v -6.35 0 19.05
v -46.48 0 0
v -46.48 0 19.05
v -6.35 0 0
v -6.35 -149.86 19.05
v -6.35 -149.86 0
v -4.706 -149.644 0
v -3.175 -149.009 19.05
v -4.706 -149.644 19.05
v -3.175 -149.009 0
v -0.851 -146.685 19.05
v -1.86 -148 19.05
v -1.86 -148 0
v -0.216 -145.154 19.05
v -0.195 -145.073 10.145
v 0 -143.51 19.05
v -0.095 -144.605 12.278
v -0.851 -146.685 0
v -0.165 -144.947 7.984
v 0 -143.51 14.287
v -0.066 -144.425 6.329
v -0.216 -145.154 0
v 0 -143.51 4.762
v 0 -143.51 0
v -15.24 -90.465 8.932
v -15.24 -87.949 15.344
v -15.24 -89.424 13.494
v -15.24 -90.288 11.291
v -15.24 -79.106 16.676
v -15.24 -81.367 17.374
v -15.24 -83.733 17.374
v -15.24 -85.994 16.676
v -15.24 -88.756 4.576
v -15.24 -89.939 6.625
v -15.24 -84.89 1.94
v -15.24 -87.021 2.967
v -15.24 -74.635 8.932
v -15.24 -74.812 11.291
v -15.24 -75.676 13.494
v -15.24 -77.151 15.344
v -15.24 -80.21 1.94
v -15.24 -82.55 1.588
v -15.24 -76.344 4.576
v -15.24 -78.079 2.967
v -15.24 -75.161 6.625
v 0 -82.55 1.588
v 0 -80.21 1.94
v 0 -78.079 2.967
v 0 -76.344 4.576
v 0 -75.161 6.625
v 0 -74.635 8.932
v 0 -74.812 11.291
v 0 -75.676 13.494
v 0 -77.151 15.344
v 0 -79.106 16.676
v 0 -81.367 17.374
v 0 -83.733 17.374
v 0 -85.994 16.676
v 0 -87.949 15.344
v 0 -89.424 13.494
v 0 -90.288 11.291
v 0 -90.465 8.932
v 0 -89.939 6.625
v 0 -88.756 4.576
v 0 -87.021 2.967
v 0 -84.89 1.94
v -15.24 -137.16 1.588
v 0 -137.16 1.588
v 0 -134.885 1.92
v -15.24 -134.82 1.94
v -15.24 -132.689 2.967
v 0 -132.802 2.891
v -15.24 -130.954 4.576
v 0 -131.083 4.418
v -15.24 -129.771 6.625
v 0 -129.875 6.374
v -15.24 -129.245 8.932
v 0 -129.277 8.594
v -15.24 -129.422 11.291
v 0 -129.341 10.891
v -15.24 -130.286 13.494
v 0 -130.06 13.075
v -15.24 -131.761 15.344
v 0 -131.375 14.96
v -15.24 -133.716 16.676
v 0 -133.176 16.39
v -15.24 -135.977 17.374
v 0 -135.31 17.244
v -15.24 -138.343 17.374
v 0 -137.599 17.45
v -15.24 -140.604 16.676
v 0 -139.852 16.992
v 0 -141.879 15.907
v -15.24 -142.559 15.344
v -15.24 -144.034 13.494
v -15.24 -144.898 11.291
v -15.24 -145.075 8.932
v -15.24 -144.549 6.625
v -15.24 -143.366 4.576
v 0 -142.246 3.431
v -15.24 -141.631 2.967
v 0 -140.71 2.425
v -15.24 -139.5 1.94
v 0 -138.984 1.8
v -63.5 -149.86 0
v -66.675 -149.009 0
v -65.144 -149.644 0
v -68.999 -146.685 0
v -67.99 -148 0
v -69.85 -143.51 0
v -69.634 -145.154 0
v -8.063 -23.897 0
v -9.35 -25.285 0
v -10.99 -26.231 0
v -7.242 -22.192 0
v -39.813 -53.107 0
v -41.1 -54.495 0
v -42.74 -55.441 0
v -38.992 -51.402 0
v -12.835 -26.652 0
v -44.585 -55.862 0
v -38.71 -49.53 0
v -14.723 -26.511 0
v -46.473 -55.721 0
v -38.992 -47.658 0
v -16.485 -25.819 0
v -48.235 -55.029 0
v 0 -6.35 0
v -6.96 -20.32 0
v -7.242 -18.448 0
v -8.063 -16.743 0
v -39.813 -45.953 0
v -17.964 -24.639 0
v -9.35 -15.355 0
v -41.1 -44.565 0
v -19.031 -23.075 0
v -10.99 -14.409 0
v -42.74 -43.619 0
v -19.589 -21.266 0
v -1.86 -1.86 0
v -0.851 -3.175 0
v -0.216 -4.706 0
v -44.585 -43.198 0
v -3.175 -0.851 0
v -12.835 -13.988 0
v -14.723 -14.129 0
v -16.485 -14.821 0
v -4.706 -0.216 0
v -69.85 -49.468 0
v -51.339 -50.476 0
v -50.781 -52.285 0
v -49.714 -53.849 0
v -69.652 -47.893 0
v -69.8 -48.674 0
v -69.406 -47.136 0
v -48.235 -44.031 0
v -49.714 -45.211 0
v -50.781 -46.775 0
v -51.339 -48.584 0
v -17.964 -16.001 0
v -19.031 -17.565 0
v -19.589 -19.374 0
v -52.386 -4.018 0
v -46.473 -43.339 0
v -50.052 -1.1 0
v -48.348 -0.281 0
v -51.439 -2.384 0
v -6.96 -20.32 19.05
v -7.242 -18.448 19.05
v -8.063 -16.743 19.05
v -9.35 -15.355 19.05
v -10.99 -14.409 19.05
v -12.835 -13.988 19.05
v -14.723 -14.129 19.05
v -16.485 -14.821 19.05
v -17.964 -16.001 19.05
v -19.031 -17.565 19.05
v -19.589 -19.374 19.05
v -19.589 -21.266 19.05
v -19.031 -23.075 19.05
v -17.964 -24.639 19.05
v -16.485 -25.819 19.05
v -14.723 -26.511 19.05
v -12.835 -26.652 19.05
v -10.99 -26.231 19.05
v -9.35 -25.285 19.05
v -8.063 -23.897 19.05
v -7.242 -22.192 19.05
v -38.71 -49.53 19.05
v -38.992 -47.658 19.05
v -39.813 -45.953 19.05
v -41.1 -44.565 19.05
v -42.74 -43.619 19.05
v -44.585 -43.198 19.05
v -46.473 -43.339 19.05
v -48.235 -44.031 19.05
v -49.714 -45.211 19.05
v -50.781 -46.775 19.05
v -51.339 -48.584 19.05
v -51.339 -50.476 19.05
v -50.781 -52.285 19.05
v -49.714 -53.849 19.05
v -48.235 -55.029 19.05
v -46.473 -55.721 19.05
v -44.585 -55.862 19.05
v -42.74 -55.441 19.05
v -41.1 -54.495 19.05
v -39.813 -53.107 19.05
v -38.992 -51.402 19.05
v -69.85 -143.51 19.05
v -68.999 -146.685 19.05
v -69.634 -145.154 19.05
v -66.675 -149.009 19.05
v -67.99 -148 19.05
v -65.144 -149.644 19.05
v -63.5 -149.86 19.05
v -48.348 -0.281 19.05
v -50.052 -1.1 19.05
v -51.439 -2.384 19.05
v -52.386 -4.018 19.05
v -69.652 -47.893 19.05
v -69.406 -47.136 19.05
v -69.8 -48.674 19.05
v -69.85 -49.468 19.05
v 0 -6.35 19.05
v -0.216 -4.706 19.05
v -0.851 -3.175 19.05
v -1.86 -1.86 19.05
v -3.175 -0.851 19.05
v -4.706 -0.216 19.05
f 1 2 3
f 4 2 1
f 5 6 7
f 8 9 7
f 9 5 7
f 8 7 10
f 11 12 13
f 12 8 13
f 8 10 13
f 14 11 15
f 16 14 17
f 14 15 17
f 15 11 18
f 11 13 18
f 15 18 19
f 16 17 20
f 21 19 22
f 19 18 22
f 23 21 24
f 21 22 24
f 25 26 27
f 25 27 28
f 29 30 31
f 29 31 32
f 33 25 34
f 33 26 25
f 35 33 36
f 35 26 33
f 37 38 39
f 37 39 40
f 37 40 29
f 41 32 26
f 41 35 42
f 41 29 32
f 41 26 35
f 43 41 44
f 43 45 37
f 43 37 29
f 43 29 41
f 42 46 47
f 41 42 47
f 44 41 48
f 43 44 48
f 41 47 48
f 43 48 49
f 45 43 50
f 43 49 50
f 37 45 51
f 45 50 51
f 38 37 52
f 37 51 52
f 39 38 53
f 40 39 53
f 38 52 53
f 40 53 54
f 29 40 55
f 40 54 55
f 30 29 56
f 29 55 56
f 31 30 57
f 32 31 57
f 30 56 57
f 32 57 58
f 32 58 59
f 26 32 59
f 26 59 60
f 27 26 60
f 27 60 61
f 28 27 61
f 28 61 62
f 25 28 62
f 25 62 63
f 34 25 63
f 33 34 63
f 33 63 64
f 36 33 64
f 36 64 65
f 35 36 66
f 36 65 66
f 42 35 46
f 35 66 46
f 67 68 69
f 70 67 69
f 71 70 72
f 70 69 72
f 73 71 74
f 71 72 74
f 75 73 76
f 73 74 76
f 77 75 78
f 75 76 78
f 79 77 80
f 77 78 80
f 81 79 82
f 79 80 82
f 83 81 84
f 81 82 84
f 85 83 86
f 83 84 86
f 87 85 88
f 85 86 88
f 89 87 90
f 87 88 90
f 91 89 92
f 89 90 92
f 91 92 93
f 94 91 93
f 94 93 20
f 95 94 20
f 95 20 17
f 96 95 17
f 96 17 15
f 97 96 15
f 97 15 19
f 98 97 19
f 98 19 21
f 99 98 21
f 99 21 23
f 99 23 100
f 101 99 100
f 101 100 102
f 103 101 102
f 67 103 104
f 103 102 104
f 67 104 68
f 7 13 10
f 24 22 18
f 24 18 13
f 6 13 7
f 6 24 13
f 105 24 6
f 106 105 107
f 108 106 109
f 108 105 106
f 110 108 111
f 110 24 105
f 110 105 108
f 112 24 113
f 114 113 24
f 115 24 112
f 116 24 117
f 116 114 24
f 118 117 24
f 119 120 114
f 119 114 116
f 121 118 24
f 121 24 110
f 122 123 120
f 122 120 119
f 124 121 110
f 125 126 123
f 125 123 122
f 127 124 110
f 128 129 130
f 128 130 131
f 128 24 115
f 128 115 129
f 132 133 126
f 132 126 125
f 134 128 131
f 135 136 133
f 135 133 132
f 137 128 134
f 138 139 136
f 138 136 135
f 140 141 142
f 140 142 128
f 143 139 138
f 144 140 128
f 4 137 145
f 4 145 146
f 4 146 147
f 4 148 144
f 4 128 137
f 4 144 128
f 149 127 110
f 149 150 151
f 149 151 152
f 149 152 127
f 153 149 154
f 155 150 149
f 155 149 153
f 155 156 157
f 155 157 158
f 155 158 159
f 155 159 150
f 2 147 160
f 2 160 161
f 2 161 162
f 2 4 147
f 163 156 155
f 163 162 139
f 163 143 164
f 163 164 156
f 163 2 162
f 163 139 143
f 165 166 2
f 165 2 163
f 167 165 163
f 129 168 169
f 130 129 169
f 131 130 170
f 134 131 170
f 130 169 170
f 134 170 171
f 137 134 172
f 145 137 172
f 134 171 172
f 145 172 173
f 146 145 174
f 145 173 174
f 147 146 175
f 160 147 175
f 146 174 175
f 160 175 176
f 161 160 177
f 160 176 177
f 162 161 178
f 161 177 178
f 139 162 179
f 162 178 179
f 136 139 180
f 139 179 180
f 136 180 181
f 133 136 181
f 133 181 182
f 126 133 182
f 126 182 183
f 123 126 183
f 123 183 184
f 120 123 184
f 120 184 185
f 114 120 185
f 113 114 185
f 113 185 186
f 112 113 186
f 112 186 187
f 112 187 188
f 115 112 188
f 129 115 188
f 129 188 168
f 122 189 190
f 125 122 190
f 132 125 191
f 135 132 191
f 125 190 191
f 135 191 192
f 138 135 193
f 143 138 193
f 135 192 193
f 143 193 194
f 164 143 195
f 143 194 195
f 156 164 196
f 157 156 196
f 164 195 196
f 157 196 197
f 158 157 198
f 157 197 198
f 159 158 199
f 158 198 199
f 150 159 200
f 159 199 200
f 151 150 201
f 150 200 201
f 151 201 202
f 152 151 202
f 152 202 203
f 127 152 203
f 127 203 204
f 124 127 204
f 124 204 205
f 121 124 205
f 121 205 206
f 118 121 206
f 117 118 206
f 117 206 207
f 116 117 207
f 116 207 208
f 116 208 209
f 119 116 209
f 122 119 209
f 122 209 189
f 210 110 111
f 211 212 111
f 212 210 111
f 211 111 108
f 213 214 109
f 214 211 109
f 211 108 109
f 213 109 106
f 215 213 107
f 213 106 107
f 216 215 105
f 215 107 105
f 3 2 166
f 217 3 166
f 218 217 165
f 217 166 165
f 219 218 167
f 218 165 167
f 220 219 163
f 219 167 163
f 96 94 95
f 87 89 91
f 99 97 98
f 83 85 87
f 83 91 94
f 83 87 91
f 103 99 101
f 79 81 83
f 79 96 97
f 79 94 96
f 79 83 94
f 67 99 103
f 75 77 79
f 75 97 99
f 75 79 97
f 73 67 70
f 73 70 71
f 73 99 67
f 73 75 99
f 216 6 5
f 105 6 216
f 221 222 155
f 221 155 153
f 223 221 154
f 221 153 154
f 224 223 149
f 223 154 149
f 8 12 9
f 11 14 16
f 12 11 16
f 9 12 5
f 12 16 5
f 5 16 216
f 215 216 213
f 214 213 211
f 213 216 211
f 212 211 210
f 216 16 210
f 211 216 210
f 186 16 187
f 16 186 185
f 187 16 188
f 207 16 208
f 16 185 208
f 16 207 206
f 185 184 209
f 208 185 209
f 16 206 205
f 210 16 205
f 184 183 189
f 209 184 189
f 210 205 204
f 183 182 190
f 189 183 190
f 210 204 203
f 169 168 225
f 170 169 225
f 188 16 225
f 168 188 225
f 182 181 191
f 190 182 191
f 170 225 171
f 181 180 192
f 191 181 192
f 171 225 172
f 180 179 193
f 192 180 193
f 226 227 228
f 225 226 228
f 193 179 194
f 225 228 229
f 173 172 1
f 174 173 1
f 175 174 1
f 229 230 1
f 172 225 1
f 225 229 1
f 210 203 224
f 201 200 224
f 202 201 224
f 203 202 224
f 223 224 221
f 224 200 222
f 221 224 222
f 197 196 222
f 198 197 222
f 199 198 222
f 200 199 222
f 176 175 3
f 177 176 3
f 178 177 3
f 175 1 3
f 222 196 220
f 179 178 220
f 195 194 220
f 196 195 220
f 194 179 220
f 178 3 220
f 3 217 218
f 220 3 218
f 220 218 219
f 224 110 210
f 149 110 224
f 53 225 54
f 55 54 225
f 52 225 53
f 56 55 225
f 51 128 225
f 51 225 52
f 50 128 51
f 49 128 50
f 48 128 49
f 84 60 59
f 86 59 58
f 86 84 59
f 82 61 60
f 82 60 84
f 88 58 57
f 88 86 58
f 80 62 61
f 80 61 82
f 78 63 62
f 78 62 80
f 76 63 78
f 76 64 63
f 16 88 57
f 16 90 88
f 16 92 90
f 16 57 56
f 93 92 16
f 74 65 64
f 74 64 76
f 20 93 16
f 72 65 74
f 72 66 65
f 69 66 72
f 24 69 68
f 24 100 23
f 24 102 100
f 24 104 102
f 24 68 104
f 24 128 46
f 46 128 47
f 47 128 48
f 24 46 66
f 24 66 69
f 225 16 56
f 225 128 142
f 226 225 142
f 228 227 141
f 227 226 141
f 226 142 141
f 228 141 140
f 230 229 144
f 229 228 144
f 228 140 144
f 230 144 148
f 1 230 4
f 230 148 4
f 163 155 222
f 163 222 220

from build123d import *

# Parameters (mm, degrees)
BOSS_EXTRUDE1_DEPTH = 19.05
SKETCH2_R           = 7.9375
CUT_EXTRUDE1_DEPTH  = 15.24
SKETCH3_R           = 6.35
CUT_EXTRUDE3_DEPTH  = 167.433003338
FILLET1_R           = 6.35


with BuildPart() as part:
    # Sketch1 → Boss-Extrude1 (new body)
    with BuildSketch(Plane.XY):
        Polygon((0, 0), (0, -149.86), (-69.85, -149.86), (-69.85, -48.26), (-50.8, 0), align=None)
    extrude(amount=BOSS_EXTRUDE1_DEPTH)

    # Sketch2 → Cut-Extrude1 (cut)
    with BuildSketch(Plane(origin=(0, 0, 0), x_dir=(0, 0, -1), z_dir=(1, 0, 0))):
        with Locations((-9.525, -82.55)):
            Circle(SKETCH2_R)
        with Locations((-9.525, -137.16)):
            Circle(SKETCH2_R)
    extrude(amount=-CUT_EXTRUDE1_DEPTH, mode=Mode.SUBTRACT)

    # Sketch3 → Cut-Extrude3 (cut, through all)
    with BuildSketch(Plane.XY.offset(19.05)):
        with Locations((-45.0596, -49.53)):
            Circle(SKETCH3_R)
        with Locations((-13.3096, -20.32)):
            Circle(SKETCH3_R)
    extrude(amount=-CUT_EXTRUDE3_DEPTH, mode=Mode.SUBTRACT)

    # Fillet1
    # the kernel refuses this fillet: 6.35 mm, written as the material it takes off along each edge
    with BuildSketch(Plane(origin=(0, 0, -15.875), x_dir=(0, -1, 0), z_dir=(0, 0, 1))) as fillet1_piece_1:
        with BuildLine():
            CenterArc((FILLET1_R, -FILLET1_R), FILLET1_R, 90, 90)
            Line((0, -FILLET1_R), (0, 0))
            Line((0, 0), (FILLET1_R, 0))
        make_face()
    extrude(amount=50.8, mode=Mode.SUBTRACT)
    with BuildSketch(Plane(origin=(0, -149.86, -15.875), x_dir=(0, 1, 0), z_dir=(0, 0, 1)), Plane(origin=(-69.85, -149.86, -15.875), x_dir=(1, 0, 0), z_dir=(0, 0, 1))) as fillet1_piece_2:
        with BuildLine():
            CenterArc((FILLET1_R, FILLET1_R), FILLET1_R, 180, 90)
            Line((0, FILLET1_R), (0, 0))
            Line((0, 0), (FILLET1_R, 0))
        make_face()
    extrude(amount=50.8, mode=Mode.SUBTRACT)
    with BuildSketch(Plane(origin=(-69.85, -48.26, -3.019844557), x_dir=(0.367166534736053, 0.9301552213313209, 0), z_dir=(0, 0, 1))) as fillet1_piece_3:
        with BuildLine():
            CenterArc((FILLET1_R * 0.190226428775, -FILLET1_R), FILLET1_R, 90, 21.540975919)
            Line((-FILLET1_R * 0.176940105961, -FILLET1_R * 0.0698447786687), (0, 0))
            Line((0, 0), (FILLET1_R * 0.190226428775, 0))
        make_face()
    extrude(amount=25.089689114, mode=Mode.SUBTRACT)
    with BuildSketch(Plane(origin=(-50.8, 0, -10.800596536), x_dir=(1, 0, 0), z_dir=(0, 0, 1))) as fillet1_piece_4:
        with BuildLine():
            CenterArc((FILLET1_R * 0.680352537675, -FILLET1_R), FILLET1_R, 90, 68.459024081)
            Line((-FILLET1_R * 0.249802683657, -FILLET1_R * 0.632833465264), (0, 0))
            Line((0, 0), (FILLET1_R * 0.680352537675, 0))
        make_face()
    extrude(amount=40.651193071, mode=Mode.SUBTRACT)


solid = part.part
